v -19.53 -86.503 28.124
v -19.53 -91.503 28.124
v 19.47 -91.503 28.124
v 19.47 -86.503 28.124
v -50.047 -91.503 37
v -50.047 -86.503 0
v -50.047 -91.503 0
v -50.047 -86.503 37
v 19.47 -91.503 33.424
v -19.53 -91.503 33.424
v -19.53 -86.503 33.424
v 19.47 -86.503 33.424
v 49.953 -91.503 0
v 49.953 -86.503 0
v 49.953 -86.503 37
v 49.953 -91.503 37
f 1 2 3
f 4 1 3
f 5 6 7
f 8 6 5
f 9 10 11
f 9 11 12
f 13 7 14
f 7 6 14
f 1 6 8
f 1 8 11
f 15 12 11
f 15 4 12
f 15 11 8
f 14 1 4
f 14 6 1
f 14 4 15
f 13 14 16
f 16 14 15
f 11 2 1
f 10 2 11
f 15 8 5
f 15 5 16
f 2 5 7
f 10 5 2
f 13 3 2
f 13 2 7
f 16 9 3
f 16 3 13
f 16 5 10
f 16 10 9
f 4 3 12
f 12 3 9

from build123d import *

# Parameters (mm, degrees)
CROQUIS1_W              = 100
CROQUIS1_H              = 4
SALIENTE_EXTRUIR1_DEPTH = 37
CROQUIS2_W              = 100
CROQUIS2_H              = 37
SALIENTE_EXTRUIR2_DEPTH = 1
CROQUIS3_W              = 39
CROQUIS3_H              = 5.3
CORTAR_EXTRUIR1_DEPTH   = 10


with BuildPart() as part:
    # Croquis1 → Saliente-Extruir1 (new body)
    with BuildSketch(Plane.XY):
        with Locations((-0.047455137, -88.502540378)):
            Rectangle(CROQUIS1_W, CROQUIS1_H)
    extrude(amount=SALIENTE_EXTRUIR1_DEPTH)

    # Croquis2 → Saliente-Extruir2 (add)
    with BuildSketch(Plane.XZ.offset(90.502540378)):
        with Locations((-0.047455137, 18.5)):
            Rectangle(CROQUIS2_W, CROQUIS2_H)
    extrude(amount=SALIENTE_EXTRUIR2_DEPTH)

    # Croquis3 → Cortar-Extruir1 (cut)
    with BuildSketch(Plane.XZ.offset(91.502540378)):
        with Locations((-0.030380106, 30.774409531)):
            Rectangle(CROQUIS3_W, CROQUIS3_H)
    extrude(amount=-CORTAR_EXTRUIR1_DEPTH, mode=Mode.SUBTRACT)


solid = part.part
